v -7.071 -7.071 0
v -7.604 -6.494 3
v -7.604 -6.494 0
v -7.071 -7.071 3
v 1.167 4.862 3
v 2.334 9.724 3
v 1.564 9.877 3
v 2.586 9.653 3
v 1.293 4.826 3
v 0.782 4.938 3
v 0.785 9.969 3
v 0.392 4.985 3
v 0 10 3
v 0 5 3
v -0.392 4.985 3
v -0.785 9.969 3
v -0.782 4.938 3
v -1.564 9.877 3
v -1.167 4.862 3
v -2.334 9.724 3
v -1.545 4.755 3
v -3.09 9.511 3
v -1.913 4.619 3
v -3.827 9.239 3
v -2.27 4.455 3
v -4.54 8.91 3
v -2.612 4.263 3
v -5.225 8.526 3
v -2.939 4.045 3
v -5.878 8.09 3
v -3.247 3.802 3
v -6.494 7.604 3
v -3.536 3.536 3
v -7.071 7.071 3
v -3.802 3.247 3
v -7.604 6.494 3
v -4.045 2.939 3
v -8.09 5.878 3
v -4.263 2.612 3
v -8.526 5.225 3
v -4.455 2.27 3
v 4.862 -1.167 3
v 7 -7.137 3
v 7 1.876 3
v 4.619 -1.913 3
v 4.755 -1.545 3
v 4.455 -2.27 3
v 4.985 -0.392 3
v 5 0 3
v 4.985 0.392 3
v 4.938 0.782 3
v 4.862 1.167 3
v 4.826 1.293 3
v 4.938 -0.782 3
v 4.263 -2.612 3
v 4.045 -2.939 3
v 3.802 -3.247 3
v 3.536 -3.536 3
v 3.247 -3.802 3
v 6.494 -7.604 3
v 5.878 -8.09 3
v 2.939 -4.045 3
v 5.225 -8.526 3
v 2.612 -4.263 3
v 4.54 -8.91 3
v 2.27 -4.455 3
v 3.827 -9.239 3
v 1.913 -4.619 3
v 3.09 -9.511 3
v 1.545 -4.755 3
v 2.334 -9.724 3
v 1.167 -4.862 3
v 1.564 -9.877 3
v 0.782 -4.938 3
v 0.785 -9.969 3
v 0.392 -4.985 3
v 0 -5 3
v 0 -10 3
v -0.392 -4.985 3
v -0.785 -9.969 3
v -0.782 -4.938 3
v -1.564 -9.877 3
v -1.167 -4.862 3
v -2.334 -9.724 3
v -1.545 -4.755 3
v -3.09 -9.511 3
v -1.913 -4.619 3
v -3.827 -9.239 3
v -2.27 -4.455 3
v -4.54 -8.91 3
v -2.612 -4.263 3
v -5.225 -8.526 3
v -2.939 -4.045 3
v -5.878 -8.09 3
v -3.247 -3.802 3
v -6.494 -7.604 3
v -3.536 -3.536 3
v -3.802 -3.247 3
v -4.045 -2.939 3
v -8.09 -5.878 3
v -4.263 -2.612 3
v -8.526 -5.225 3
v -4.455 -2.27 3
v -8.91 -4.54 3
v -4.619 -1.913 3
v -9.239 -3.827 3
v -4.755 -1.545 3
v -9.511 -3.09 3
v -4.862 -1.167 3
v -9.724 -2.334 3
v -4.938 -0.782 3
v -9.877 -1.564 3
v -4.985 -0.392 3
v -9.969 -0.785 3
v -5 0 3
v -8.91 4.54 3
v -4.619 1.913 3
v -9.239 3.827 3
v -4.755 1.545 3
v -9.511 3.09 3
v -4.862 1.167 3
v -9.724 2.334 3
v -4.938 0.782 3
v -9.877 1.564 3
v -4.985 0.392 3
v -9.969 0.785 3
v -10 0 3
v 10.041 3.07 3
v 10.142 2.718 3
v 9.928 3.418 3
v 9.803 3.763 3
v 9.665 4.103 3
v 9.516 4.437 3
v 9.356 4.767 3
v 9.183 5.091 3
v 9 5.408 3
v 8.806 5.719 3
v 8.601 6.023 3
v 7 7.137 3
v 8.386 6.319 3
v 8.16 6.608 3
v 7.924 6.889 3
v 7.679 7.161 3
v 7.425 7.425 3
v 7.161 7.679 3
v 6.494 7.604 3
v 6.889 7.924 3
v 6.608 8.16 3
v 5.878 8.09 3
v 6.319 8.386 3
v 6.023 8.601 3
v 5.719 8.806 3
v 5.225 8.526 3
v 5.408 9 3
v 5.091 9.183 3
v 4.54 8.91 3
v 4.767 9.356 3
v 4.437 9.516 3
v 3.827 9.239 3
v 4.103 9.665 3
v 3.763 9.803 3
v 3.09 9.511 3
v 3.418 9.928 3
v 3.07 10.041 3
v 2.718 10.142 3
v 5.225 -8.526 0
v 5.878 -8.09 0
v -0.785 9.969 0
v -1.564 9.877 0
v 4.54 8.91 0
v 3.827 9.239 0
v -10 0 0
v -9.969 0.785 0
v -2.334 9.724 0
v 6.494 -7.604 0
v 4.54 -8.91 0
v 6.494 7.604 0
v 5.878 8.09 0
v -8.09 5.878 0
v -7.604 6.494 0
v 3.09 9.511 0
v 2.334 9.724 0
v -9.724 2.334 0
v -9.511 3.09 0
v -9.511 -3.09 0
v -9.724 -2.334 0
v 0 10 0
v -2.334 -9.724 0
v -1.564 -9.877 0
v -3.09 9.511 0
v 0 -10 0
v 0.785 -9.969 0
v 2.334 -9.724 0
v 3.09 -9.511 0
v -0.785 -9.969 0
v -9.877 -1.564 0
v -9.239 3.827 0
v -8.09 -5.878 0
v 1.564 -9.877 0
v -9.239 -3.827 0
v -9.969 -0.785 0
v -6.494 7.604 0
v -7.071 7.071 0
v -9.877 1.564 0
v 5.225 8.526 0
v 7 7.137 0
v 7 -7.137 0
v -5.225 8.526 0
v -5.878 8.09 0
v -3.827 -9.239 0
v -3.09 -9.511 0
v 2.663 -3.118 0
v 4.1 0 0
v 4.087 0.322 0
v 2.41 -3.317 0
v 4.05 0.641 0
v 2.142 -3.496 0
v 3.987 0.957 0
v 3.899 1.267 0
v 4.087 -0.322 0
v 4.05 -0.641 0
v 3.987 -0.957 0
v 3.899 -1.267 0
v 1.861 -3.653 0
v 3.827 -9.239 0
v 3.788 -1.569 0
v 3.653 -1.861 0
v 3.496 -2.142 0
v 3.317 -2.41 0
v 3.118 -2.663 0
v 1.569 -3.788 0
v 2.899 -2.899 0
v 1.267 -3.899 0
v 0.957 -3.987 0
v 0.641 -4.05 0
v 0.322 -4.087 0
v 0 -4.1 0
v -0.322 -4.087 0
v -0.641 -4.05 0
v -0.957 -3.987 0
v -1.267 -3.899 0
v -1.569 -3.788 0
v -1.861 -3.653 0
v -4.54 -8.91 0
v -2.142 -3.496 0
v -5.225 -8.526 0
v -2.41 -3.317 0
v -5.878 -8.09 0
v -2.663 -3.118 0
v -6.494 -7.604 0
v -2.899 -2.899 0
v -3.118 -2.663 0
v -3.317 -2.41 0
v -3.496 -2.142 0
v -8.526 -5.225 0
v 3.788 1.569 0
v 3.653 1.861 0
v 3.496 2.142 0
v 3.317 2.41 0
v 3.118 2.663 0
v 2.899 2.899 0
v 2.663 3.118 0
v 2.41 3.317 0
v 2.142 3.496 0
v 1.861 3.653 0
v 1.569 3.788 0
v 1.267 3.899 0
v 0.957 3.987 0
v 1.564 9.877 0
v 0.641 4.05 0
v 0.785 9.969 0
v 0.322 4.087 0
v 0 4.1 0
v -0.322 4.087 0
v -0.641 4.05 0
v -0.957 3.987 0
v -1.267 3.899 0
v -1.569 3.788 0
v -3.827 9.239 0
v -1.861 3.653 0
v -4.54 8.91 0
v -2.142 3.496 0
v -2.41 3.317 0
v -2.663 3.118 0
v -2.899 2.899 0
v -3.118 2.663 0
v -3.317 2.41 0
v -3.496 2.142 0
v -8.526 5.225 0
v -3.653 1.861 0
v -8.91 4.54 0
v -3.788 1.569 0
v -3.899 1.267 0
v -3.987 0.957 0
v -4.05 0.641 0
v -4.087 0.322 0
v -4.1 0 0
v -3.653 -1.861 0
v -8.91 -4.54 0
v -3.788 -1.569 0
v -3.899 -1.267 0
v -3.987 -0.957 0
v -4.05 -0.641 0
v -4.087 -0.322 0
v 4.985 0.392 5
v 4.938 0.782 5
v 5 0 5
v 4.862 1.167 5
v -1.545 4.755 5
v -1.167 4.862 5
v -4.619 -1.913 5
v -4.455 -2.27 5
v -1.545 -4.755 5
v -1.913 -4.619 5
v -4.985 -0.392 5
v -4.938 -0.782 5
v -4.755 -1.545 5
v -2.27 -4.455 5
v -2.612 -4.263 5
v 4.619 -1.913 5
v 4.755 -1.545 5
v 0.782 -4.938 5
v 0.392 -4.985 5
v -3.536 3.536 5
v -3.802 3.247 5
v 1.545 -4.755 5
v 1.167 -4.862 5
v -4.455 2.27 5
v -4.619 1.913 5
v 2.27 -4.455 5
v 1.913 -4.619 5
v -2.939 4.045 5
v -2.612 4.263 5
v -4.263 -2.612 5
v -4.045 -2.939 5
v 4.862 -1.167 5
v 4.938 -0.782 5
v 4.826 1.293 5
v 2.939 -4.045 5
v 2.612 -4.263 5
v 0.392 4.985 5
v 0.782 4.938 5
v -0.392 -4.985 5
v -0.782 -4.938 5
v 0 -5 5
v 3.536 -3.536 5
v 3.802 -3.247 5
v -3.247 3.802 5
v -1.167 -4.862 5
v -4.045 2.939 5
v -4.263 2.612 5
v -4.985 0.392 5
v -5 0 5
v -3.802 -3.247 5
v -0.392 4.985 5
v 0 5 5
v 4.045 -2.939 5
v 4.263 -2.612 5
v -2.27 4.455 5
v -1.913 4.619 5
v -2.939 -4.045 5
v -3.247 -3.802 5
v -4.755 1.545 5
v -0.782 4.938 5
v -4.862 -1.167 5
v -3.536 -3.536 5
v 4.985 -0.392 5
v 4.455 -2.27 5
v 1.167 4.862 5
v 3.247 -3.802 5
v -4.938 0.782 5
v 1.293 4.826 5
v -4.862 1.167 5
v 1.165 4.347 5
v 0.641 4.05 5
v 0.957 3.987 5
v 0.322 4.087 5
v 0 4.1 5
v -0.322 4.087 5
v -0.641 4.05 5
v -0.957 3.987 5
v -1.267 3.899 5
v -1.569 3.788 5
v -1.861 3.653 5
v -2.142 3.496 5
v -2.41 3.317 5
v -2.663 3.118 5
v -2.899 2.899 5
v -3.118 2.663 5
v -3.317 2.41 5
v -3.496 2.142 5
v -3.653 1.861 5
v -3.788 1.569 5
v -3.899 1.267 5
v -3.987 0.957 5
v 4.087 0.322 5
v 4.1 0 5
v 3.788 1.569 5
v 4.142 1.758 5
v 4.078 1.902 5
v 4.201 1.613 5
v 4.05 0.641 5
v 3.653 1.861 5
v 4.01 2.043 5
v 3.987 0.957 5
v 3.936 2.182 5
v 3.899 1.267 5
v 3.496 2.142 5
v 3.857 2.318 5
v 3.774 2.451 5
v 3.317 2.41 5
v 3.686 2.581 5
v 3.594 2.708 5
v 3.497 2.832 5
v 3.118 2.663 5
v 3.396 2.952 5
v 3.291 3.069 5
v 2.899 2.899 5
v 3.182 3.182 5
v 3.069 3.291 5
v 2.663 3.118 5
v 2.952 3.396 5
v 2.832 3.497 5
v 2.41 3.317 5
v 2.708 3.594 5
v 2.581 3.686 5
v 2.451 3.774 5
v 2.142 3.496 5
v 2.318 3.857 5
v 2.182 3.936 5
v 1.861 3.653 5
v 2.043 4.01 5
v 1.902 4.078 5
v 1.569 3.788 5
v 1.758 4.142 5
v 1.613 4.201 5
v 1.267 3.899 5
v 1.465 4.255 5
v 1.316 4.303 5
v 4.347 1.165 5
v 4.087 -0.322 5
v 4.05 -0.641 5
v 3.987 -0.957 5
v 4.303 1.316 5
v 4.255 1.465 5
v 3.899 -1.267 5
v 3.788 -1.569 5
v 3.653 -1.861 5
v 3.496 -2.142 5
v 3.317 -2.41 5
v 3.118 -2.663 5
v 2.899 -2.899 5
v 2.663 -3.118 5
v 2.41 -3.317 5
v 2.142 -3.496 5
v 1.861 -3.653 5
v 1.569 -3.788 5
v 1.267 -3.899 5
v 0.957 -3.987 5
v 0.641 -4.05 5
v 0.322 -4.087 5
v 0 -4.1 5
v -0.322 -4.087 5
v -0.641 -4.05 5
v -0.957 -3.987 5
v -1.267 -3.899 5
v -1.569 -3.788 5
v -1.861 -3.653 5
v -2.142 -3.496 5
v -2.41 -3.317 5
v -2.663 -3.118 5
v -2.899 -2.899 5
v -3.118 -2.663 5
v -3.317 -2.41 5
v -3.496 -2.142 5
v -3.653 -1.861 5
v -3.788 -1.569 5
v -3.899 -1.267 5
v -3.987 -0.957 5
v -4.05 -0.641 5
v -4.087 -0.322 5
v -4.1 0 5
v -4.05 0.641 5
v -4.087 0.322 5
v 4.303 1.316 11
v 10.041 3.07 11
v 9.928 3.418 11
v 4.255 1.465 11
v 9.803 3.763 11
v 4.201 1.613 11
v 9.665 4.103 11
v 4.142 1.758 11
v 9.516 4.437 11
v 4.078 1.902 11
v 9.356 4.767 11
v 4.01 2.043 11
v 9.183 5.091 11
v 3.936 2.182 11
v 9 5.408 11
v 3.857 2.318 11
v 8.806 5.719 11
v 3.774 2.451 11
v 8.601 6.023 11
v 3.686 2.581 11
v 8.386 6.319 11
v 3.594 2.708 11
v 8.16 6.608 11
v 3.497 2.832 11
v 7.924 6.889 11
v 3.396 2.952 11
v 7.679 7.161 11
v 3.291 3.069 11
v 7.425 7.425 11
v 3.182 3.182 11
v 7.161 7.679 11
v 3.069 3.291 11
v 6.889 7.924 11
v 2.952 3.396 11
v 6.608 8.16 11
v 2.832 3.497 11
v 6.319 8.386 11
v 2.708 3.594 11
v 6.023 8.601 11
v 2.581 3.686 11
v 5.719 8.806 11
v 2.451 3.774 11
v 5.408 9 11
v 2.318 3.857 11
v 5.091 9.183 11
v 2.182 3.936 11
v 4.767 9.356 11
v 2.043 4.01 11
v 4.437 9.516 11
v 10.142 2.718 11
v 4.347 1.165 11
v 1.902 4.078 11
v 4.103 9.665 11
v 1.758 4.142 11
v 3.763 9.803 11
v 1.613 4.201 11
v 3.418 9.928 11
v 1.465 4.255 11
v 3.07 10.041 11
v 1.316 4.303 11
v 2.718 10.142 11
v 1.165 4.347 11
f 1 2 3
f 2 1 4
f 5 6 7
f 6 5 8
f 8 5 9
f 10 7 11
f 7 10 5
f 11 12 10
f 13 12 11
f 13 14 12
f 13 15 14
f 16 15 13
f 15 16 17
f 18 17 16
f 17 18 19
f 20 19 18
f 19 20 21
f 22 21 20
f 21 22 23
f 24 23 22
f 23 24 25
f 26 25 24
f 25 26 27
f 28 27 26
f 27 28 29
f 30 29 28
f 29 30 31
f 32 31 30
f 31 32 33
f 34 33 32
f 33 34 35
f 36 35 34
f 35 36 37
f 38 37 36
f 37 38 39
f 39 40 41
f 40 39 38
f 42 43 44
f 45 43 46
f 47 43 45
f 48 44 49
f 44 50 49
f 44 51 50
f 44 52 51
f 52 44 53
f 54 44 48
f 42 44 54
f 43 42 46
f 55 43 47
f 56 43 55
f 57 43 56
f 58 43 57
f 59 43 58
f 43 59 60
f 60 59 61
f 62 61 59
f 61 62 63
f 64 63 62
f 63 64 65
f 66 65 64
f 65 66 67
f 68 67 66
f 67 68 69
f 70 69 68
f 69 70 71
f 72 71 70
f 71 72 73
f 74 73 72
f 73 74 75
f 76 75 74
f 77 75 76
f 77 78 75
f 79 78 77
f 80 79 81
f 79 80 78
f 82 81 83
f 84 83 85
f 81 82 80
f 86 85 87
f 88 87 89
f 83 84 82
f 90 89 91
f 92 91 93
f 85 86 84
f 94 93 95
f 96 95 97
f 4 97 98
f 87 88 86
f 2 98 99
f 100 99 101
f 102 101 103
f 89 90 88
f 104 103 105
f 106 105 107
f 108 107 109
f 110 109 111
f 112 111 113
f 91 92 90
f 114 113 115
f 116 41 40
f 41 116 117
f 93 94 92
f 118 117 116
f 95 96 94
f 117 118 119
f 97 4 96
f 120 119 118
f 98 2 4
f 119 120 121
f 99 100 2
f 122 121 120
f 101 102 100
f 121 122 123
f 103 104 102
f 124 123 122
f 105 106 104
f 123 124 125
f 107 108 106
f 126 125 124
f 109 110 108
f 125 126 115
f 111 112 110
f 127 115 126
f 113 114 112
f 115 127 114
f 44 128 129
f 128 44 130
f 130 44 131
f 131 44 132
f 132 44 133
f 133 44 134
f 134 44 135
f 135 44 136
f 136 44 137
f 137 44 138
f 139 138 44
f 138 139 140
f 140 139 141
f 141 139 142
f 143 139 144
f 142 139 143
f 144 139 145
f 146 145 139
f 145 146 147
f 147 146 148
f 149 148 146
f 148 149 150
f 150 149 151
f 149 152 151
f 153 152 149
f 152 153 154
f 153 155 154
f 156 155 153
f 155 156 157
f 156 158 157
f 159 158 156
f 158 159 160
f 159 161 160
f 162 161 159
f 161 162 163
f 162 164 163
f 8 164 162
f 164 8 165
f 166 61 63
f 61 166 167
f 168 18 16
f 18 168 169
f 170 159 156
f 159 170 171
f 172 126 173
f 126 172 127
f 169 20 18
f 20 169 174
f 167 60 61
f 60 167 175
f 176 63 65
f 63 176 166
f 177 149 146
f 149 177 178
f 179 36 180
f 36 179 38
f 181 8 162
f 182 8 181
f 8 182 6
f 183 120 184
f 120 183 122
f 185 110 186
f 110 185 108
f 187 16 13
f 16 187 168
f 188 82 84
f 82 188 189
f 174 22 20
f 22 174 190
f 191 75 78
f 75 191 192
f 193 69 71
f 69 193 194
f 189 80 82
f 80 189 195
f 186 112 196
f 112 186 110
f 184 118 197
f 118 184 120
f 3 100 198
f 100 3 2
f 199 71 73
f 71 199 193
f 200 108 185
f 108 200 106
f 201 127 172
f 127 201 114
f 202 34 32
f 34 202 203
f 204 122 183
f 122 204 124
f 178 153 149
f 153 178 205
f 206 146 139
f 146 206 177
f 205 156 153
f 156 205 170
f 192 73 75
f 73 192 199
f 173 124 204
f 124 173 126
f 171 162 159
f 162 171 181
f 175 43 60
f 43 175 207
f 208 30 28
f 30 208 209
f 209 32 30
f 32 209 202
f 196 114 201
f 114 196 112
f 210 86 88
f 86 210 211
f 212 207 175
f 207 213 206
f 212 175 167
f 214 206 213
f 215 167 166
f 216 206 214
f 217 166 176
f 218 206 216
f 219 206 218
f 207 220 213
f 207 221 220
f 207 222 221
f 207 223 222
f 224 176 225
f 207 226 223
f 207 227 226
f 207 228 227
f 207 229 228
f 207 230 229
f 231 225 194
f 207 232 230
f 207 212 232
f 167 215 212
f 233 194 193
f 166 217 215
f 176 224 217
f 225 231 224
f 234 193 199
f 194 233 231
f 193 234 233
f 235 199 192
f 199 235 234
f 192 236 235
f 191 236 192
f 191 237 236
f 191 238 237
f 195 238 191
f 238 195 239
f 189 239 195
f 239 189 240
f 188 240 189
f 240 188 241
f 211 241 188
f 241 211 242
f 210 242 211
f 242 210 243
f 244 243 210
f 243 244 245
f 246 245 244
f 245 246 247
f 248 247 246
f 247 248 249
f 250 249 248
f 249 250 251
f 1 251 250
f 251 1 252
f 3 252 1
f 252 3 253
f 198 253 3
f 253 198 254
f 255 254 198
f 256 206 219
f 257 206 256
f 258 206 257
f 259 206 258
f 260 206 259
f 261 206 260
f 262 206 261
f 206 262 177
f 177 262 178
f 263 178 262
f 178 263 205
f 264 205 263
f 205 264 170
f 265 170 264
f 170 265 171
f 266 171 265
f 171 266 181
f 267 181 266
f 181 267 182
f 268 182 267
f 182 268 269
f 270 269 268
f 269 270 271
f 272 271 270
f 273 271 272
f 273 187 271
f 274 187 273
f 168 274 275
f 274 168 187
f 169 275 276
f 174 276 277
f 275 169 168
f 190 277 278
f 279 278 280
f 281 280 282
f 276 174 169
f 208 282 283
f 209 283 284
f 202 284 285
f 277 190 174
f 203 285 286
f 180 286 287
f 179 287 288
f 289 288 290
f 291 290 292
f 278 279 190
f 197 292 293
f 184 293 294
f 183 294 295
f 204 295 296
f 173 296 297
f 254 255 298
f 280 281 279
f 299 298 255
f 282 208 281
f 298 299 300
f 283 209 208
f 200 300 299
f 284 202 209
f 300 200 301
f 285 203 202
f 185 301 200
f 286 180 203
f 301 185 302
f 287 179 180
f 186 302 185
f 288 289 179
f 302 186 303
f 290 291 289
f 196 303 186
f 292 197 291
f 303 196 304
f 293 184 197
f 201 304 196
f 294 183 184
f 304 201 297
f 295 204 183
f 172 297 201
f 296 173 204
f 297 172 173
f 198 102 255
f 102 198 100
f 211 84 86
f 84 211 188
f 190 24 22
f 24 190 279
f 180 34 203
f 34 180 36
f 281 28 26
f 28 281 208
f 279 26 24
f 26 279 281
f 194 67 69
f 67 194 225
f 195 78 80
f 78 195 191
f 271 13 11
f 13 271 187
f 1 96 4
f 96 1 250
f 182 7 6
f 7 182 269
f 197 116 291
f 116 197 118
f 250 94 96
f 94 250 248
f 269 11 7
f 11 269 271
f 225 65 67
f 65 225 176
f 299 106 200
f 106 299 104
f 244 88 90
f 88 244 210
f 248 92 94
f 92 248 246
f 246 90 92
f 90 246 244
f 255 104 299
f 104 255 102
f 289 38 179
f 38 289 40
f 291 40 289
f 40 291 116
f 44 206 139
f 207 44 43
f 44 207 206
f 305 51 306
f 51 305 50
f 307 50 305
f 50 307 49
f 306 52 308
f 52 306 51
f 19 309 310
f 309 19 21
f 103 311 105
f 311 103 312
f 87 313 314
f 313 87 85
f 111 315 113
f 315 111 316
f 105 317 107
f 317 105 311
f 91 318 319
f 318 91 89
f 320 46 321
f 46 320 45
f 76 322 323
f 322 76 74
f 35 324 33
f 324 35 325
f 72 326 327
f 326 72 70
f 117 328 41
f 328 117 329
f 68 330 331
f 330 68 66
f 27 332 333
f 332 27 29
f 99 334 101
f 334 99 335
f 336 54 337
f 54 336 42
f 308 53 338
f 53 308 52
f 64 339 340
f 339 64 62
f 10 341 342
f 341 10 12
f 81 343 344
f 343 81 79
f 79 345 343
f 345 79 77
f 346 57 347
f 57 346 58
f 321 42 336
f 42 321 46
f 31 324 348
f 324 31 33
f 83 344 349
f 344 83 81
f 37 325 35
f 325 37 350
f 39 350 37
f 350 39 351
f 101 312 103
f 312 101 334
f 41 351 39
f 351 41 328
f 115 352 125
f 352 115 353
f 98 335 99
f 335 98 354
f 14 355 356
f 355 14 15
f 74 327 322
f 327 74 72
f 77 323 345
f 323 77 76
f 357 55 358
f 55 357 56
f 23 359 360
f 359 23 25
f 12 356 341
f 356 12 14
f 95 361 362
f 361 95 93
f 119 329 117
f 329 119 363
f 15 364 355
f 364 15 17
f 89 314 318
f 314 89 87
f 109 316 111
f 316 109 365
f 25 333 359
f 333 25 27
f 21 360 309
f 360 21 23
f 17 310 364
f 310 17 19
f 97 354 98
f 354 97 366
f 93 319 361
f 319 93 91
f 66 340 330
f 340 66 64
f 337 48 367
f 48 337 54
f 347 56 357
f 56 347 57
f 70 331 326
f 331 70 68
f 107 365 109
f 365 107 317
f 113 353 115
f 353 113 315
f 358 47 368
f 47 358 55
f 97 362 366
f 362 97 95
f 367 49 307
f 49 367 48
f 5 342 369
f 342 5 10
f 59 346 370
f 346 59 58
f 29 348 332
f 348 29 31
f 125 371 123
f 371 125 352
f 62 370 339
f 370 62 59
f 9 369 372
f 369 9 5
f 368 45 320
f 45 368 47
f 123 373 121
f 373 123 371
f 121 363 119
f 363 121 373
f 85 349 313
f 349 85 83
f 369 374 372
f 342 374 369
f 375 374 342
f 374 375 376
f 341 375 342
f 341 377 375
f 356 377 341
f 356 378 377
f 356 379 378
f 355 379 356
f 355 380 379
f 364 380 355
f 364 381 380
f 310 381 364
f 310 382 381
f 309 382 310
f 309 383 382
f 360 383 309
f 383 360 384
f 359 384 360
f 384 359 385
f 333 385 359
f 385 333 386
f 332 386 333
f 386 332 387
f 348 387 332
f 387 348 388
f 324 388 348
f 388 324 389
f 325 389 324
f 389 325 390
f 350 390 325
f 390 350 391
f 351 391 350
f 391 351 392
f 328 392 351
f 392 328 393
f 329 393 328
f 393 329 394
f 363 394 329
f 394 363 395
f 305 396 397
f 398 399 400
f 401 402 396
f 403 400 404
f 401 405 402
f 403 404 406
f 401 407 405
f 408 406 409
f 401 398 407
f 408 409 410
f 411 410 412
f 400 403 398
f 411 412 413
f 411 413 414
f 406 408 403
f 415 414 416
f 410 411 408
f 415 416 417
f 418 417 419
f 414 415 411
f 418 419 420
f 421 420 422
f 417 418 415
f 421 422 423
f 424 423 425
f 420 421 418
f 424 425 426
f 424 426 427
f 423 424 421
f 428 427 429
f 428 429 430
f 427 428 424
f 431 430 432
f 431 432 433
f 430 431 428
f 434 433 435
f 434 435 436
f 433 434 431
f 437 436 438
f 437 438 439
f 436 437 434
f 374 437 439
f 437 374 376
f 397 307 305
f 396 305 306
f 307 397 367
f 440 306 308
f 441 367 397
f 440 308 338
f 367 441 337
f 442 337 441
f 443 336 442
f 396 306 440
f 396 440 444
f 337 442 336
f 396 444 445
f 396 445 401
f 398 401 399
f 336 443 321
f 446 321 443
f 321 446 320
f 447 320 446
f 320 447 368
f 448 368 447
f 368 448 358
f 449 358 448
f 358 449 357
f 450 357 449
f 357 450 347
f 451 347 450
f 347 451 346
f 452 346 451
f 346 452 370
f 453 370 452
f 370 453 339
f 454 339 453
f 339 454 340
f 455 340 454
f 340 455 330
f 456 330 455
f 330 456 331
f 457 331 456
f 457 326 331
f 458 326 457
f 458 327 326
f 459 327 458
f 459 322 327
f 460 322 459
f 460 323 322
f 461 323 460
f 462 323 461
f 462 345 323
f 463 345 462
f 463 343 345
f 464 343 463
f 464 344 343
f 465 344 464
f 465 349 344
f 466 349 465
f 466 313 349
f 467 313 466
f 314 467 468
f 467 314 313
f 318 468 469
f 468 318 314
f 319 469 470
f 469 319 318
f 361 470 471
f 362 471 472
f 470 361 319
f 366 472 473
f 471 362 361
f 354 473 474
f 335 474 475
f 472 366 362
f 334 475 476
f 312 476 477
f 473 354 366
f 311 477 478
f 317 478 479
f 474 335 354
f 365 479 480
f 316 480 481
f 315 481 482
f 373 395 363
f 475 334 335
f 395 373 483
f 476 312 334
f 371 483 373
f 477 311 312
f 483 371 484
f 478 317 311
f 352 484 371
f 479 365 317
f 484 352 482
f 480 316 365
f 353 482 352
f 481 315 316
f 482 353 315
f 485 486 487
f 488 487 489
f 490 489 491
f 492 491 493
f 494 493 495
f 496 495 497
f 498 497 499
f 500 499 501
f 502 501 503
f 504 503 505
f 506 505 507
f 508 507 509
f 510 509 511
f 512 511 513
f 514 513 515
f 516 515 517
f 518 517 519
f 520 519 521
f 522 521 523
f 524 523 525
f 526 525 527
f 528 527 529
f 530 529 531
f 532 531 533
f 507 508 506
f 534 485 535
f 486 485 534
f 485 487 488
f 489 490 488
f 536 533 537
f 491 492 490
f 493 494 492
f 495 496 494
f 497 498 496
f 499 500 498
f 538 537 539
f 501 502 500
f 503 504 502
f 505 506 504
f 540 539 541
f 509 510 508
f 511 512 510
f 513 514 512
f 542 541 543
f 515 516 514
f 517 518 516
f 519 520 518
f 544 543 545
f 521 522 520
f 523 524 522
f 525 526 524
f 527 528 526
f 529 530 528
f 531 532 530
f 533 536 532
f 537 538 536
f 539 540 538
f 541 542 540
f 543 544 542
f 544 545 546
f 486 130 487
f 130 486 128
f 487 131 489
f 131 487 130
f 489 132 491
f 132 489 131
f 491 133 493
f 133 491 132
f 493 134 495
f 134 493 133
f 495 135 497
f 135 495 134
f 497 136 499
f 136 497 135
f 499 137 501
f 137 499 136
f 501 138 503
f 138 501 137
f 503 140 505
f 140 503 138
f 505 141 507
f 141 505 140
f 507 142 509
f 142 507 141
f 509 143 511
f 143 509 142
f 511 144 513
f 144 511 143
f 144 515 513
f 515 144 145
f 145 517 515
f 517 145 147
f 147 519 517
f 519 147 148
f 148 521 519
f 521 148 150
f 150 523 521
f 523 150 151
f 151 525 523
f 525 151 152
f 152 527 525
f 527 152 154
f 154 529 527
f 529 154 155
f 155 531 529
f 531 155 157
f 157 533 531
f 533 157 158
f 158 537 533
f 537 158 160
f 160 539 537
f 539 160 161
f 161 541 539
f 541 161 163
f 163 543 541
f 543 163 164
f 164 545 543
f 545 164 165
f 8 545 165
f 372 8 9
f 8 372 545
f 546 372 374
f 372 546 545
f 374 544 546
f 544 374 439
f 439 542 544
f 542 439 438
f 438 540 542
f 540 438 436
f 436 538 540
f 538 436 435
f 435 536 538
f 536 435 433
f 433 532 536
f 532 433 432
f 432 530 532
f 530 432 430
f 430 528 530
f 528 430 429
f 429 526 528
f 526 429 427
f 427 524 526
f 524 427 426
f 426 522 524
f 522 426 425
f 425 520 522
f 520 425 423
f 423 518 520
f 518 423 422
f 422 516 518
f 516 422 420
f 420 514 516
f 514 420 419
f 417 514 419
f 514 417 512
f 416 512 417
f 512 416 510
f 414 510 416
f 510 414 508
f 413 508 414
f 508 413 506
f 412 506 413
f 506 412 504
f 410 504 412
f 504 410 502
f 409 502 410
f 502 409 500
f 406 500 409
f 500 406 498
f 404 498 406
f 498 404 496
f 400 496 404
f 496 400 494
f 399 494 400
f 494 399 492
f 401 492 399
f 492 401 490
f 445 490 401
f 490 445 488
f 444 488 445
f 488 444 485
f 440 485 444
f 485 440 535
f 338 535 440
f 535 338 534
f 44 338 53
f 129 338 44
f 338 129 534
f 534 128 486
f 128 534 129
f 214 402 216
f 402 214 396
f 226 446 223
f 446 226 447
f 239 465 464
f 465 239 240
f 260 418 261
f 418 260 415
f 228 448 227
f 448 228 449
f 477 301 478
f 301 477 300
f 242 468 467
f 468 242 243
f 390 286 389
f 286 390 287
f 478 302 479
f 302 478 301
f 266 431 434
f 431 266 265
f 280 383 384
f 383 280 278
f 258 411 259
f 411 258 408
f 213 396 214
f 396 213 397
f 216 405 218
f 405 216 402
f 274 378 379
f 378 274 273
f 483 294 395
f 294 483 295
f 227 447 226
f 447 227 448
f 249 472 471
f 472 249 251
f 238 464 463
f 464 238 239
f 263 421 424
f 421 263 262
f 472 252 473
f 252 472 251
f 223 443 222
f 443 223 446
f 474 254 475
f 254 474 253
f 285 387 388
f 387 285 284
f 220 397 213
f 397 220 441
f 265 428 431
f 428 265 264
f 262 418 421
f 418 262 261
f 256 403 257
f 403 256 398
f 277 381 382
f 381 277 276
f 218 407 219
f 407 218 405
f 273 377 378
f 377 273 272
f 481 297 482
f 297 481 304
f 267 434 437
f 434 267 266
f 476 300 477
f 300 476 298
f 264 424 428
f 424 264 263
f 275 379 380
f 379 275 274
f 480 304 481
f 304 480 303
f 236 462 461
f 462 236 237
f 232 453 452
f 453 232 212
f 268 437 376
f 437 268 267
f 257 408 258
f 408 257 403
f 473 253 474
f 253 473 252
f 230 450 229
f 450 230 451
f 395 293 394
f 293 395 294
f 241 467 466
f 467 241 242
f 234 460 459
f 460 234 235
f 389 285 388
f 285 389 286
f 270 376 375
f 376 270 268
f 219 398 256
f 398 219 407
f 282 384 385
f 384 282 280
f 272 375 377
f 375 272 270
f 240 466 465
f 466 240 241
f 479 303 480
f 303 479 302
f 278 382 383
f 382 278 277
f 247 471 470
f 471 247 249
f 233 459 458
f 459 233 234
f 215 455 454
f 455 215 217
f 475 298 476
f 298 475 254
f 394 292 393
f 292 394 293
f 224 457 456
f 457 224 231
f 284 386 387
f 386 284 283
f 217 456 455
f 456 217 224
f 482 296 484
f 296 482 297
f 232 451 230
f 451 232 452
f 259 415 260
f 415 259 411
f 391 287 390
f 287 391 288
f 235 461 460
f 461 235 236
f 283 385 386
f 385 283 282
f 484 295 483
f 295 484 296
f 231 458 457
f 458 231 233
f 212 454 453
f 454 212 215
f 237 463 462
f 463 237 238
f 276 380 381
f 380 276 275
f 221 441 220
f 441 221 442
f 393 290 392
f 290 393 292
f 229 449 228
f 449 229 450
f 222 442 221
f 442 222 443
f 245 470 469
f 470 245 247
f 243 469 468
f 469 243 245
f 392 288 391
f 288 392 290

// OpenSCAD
// file: ../lib/stop_wedge.scad
// Annular-sector stop wedge, shared by end_cap.scad and tip_bracket.scad.
// Sits on z = 0, extends +z, centered on the +x direction. Its flat
// radial side faces land flush on the vane sleeve notch's walls (cut by
// the same kind of radial plane in vane.scad), so the stop impact is a
// face contact, not a cylinder's line contact.
//
// Fully parameterized like bores.scad: callers pass the shared
// stop_wedge_* values from design_params.scad.
//
// deg should be a multiple of 4 so the 2-degree facet steps land
// exactly on the side faces.

module stop_wedge(ri, ro, deg, h) {
    linear_extrude(height = h)
        polygon(concat(
            [for (a = [-deg / 2 : 2 : deg / 2]) [ro * cos(a), ro * sin(a)]],
            [for (a = [deg / 2 : -2 : -deg / 2]) [ri * cos(a), ri * sin(a)]]));
}
// main file
// ==============================================================================
//   TRI STOP RING — TRI VARIANT ONLY (the dual deleted its ring: the
//   cap wedge is its only stop and its thrust seat is the bought
//   PTFE washer on the bracket's flat top).
//
//   A D-shaped foot drops into the matching pocket in the tip
//   bracket's top face (the bracket's ring_pocket = true option) and
//   is trapped when the clamshell closes, the same way the rods are.
//   On top of the flush foot sits the boss ring the sleeve spins on,
//   and through it the keyed stop FIN (fin_deg grows a fin of that
//   arc, contact flank at the driven stop): in the tri the fin is
//   the only stop, the cap is a smooth retainer, and the D flat is
//   what bakes the stop angle in.
//
//   On its back, foot, boss and fin are plain vertical prisms with
//   no overhang anywhere. The thrust seat takes all the spin
//   friction, and a worn one is a tiny reprint.
// ==============================================================================

include <../design_params.scad>
use <../lib/stop_wedge.scad>

$fn = 80;

module stop_ring(fin_deg = 0) {
    // the fin's contact flank sits where the flag stops exactly at
    // panel-along-the-arm (the tri scene draws the same relation)
    wall_lo = 90 - (vane_swing_deg + fin_deg) / 2;
    difference() {
        union() {
            // D foot, flat toward outboard (+x)
            intersection() {
                cylinder(h = ring_foot_t, d = ring_foot_d);
                translate([ring_flat_x - 1000, -500, -1]) cube(1000);
            }
            // boss: the sleeve's thrust seat, as narrow as printable
            // so the friction radius, and with it the self-start
            // wind, stays minimal (performance_check gates it)
            translate([0, 0, ring_foot_t])
                cylinder(h = collar_boss_h, d = ring_boss_d);
            // optional stop fin, through the boss layer and into the
            // sleeve's lower notch (tri variant only)
            if (fin_deg > 0)
                translate([0, 0, ring_foot_t])
                    rotate([0, 0, wall_lo + fin_deg / 2])
                        stop_wedge(stop_wedge_ri, stop_wedge_ro,
                                   fin_deg,
                                   collar_boss_h + stop_wedge_len);
        }
        // free over the (static) stub: the ring is keyed, not clamped
        translate([0, 0, -0.5])
            cylinder(h = ring_foot_t + collar_boss_h + 1, d = rod_free_d);
    }
}

stop_ring(stop_wedge_deg);
